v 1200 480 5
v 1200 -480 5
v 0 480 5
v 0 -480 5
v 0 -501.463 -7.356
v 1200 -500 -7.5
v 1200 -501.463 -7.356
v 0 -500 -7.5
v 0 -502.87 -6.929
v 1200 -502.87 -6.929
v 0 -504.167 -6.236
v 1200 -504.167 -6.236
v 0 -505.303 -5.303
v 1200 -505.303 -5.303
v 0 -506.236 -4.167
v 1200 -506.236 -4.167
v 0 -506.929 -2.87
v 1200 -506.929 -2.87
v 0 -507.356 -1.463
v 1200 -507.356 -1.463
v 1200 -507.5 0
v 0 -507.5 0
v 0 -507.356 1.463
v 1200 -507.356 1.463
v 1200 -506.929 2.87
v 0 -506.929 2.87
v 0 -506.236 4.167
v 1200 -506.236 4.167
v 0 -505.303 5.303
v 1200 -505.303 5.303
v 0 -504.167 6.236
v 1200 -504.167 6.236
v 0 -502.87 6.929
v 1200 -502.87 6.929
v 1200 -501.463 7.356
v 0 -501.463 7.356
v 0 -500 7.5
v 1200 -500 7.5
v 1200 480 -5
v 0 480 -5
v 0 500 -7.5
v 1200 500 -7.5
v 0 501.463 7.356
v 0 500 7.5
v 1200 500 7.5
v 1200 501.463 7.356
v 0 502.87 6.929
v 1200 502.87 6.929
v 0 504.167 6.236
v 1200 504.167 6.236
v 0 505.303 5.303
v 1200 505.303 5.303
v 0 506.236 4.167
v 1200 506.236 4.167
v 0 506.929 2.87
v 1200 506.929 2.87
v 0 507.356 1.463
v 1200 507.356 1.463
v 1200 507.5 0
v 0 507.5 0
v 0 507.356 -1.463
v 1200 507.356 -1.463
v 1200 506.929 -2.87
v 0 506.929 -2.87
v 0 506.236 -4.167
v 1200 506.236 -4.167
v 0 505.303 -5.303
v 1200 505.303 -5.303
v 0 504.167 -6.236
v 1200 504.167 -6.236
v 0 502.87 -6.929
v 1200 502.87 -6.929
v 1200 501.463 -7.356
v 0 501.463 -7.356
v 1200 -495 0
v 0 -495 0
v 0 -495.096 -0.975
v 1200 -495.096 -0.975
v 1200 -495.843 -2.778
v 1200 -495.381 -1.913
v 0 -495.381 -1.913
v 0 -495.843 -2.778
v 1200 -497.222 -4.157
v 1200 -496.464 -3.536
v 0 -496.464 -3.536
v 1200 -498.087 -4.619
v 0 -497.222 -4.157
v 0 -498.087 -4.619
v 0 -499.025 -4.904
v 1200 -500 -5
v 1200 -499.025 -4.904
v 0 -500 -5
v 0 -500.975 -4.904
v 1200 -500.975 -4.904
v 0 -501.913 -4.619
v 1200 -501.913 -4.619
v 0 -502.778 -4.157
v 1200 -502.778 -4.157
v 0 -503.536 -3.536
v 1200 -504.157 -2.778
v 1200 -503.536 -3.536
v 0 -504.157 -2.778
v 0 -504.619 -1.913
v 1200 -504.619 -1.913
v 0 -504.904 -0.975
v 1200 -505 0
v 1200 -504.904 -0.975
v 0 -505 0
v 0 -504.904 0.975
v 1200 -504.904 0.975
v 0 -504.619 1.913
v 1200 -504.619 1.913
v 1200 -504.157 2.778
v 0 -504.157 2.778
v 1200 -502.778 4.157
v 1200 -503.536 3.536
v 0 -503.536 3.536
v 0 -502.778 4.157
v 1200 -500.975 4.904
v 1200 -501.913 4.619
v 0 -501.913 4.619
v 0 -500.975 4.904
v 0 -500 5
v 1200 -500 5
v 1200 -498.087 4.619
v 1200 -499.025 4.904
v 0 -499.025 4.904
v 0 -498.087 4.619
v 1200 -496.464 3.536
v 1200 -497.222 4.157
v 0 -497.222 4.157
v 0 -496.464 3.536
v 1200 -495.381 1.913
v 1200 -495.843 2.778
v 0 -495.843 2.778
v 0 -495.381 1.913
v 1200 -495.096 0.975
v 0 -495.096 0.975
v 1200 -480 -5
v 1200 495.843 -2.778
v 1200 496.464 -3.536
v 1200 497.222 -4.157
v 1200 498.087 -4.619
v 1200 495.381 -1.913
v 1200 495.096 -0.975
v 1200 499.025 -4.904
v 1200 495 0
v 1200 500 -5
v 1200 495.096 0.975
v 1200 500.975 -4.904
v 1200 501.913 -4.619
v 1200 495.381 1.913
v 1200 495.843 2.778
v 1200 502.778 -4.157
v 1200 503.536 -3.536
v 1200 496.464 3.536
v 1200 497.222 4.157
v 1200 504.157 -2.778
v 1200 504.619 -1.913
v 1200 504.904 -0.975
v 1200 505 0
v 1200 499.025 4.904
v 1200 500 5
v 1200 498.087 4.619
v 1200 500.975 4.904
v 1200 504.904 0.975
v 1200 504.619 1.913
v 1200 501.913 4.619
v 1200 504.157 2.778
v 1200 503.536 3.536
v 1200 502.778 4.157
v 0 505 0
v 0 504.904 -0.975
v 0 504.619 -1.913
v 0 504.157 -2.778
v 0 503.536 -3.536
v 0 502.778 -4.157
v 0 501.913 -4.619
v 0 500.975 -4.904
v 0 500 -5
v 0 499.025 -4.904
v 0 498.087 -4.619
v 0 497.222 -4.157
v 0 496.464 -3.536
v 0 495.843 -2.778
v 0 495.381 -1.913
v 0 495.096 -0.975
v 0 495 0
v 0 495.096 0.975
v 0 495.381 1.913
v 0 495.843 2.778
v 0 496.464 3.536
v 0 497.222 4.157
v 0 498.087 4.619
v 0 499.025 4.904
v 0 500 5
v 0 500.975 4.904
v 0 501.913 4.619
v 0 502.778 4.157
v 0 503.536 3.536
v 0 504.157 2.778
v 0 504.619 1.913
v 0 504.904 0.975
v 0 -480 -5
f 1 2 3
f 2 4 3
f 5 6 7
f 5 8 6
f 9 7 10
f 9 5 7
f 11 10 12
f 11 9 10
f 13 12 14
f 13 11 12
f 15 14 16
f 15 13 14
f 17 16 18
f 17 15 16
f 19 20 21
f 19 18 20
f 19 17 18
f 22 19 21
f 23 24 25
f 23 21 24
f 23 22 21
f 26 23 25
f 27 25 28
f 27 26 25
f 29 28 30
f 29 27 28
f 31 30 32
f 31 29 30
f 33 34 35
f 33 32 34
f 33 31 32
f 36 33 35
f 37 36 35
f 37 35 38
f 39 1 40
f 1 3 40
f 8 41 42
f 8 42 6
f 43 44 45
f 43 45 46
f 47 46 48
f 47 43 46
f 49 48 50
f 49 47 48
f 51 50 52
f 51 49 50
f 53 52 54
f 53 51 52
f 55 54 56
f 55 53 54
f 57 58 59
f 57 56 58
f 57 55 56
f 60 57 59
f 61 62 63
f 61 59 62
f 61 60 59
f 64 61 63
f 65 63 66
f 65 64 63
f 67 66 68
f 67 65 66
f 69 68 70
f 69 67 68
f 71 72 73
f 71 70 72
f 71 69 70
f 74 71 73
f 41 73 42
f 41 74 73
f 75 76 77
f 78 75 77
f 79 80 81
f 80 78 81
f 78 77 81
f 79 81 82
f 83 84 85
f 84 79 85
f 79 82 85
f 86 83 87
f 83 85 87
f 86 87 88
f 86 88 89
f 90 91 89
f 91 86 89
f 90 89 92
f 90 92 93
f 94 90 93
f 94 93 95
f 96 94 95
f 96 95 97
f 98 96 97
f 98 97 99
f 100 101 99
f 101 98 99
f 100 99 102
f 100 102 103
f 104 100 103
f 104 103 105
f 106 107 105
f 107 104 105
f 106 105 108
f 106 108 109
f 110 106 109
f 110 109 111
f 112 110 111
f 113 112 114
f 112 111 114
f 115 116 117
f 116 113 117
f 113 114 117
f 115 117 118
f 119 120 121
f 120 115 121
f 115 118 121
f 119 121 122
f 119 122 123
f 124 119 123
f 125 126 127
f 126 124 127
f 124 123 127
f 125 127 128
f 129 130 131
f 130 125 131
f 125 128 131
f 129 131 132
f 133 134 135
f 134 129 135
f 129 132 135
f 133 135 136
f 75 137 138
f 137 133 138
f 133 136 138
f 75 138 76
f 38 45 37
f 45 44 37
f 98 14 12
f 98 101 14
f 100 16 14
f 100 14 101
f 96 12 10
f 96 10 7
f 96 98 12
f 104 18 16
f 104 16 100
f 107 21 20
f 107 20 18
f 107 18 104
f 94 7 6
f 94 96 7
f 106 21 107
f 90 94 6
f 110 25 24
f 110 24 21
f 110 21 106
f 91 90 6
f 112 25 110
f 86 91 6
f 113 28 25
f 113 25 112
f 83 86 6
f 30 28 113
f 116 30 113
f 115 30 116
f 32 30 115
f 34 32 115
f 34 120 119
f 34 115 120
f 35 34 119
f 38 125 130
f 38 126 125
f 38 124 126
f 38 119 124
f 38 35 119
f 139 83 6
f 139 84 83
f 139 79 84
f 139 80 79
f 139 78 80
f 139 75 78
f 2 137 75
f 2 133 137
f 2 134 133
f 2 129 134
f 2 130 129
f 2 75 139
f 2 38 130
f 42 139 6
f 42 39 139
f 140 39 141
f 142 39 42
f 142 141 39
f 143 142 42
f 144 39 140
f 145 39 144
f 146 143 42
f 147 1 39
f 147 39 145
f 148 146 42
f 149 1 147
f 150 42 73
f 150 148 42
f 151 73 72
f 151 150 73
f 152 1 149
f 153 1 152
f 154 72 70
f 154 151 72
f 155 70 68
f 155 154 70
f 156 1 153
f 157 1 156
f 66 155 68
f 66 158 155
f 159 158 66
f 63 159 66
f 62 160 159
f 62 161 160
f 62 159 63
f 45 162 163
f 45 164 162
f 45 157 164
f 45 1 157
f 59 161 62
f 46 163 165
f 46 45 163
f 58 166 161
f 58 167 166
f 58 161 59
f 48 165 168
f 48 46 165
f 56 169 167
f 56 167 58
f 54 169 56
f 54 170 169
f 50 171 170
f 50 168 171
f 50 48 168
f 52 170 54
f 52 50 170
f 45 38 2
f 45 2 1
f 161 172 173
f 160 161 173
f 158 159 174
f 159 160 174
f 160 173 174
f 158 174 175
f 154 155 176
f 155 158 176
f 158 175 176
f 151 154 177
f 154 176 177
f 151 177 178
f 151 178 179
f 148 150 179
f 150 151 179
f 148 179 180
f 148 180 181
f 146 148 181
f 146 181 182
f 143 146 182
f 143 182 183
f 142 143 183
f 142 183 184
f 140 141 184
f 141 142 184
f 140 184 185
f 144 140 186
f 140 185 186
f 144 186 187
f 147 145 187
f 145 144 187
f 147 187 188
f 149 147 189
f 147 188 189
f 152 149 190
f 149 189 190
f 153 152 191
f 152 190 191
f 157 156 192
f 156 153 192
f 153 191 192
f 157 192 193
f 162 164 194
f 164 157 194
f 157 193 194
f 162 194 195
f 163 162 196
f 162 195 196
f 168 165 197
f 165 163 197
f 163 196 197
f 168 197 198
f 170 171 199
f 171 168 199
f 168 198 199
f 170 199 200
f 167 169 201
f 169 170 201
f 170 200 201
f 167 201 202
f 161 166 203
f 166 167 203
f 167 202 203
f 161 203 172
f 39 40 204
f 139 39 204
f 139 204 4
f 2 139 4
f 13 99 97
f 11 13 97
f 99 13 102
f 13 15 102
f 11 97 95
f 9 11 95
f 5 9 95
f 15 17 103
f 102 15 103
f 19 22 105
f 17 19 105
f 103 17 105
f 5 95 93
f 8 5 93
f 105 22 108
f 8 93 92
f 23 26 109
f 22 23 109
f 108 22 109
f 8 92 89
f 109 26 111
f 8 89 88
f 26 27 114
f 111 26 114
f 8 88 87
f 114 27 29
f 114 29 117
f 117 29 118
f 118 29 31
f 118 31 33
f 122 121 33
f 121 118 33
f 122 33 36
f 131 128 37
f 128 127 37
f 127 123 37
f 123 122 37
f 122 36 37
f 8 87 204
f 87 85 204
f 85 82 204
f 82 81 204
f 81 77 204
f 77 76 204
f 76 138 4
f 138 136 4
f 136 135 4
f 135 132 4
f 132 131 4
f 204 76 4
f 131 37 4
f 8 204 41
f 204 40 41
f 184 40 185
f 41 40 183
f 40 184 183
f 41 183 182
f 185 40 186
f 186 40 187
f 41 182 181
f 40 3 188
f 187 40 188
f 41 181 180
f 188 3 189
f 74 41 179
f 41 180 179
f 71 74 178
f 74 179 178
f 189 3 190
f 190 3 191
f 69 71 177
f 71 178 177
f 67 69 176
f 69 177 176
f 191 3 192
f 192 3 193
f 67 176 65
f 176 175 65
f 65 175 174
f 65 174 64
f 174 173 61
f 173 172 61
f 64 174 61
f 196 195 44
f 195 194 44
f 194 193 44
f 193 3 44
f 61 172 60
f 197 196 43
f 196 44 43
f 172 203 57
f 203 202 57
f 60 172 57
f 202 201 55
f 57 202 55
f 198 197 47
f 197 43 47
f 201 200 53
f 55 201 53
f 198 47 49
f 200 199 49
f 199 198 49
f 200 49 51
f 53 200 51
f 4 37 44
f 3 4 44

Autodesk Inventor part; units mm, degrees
ref_plane "YZ Plane" through (0, 0, 0) normal (1, 0, 0) x (0, 1, 0)
ref_plane "XZ Plane" through (0, 0, 0) normal (0, 1, 0) x (-1, 0, 0)
ref_plane "XY Plane" through (0, 0, 0) normal (0, 0, 1) x (1, 0, 0)
sketch "Sketch1" plane through (0, 0, 0) normal (1, 0, 0) x (0, 1, 0)
  circle A0 centre (500, 0) radius 5
  circle A1 centre (-500, 0) radius 5
  arc A2 (500, -7.5) -> (500, 7.5) centre (500, 0) ccw
  arc A3 (-500, 7.5) -> (-500, -7.5) centre (-500, 0) ccw
  line L0 (500, -7.5) -> (-500, -7.5)
  line L1 (500, 7.5) -> (-500, 7.5)
  line L2 (-480, 5) -> (480, 5)
  line L3 (480, 5) -> (480, -5)
  line L4 (480, -5) -> (-480, -5)
  line L5 (-480, -5) -> (-480, 5)
  line L6 (-480, 5) -> (480, -5) construction
  line L7 (480, 5) -> (-480, -5) construction
  point P0 (0, 0)
  dimension "d0" = 10
  dimension "d1" = 10
  dimension "d2" = 15
  dimension "d3" = 15
  dimension "d4" = 1000
  dimension "d5" = 1000
  dimension "d6" = 960
  dimension "d7" = 10
extrude "Extrusion1" add sketch "Sketch1" along normal blind 1200
properties part number "Conveyer Belt"
